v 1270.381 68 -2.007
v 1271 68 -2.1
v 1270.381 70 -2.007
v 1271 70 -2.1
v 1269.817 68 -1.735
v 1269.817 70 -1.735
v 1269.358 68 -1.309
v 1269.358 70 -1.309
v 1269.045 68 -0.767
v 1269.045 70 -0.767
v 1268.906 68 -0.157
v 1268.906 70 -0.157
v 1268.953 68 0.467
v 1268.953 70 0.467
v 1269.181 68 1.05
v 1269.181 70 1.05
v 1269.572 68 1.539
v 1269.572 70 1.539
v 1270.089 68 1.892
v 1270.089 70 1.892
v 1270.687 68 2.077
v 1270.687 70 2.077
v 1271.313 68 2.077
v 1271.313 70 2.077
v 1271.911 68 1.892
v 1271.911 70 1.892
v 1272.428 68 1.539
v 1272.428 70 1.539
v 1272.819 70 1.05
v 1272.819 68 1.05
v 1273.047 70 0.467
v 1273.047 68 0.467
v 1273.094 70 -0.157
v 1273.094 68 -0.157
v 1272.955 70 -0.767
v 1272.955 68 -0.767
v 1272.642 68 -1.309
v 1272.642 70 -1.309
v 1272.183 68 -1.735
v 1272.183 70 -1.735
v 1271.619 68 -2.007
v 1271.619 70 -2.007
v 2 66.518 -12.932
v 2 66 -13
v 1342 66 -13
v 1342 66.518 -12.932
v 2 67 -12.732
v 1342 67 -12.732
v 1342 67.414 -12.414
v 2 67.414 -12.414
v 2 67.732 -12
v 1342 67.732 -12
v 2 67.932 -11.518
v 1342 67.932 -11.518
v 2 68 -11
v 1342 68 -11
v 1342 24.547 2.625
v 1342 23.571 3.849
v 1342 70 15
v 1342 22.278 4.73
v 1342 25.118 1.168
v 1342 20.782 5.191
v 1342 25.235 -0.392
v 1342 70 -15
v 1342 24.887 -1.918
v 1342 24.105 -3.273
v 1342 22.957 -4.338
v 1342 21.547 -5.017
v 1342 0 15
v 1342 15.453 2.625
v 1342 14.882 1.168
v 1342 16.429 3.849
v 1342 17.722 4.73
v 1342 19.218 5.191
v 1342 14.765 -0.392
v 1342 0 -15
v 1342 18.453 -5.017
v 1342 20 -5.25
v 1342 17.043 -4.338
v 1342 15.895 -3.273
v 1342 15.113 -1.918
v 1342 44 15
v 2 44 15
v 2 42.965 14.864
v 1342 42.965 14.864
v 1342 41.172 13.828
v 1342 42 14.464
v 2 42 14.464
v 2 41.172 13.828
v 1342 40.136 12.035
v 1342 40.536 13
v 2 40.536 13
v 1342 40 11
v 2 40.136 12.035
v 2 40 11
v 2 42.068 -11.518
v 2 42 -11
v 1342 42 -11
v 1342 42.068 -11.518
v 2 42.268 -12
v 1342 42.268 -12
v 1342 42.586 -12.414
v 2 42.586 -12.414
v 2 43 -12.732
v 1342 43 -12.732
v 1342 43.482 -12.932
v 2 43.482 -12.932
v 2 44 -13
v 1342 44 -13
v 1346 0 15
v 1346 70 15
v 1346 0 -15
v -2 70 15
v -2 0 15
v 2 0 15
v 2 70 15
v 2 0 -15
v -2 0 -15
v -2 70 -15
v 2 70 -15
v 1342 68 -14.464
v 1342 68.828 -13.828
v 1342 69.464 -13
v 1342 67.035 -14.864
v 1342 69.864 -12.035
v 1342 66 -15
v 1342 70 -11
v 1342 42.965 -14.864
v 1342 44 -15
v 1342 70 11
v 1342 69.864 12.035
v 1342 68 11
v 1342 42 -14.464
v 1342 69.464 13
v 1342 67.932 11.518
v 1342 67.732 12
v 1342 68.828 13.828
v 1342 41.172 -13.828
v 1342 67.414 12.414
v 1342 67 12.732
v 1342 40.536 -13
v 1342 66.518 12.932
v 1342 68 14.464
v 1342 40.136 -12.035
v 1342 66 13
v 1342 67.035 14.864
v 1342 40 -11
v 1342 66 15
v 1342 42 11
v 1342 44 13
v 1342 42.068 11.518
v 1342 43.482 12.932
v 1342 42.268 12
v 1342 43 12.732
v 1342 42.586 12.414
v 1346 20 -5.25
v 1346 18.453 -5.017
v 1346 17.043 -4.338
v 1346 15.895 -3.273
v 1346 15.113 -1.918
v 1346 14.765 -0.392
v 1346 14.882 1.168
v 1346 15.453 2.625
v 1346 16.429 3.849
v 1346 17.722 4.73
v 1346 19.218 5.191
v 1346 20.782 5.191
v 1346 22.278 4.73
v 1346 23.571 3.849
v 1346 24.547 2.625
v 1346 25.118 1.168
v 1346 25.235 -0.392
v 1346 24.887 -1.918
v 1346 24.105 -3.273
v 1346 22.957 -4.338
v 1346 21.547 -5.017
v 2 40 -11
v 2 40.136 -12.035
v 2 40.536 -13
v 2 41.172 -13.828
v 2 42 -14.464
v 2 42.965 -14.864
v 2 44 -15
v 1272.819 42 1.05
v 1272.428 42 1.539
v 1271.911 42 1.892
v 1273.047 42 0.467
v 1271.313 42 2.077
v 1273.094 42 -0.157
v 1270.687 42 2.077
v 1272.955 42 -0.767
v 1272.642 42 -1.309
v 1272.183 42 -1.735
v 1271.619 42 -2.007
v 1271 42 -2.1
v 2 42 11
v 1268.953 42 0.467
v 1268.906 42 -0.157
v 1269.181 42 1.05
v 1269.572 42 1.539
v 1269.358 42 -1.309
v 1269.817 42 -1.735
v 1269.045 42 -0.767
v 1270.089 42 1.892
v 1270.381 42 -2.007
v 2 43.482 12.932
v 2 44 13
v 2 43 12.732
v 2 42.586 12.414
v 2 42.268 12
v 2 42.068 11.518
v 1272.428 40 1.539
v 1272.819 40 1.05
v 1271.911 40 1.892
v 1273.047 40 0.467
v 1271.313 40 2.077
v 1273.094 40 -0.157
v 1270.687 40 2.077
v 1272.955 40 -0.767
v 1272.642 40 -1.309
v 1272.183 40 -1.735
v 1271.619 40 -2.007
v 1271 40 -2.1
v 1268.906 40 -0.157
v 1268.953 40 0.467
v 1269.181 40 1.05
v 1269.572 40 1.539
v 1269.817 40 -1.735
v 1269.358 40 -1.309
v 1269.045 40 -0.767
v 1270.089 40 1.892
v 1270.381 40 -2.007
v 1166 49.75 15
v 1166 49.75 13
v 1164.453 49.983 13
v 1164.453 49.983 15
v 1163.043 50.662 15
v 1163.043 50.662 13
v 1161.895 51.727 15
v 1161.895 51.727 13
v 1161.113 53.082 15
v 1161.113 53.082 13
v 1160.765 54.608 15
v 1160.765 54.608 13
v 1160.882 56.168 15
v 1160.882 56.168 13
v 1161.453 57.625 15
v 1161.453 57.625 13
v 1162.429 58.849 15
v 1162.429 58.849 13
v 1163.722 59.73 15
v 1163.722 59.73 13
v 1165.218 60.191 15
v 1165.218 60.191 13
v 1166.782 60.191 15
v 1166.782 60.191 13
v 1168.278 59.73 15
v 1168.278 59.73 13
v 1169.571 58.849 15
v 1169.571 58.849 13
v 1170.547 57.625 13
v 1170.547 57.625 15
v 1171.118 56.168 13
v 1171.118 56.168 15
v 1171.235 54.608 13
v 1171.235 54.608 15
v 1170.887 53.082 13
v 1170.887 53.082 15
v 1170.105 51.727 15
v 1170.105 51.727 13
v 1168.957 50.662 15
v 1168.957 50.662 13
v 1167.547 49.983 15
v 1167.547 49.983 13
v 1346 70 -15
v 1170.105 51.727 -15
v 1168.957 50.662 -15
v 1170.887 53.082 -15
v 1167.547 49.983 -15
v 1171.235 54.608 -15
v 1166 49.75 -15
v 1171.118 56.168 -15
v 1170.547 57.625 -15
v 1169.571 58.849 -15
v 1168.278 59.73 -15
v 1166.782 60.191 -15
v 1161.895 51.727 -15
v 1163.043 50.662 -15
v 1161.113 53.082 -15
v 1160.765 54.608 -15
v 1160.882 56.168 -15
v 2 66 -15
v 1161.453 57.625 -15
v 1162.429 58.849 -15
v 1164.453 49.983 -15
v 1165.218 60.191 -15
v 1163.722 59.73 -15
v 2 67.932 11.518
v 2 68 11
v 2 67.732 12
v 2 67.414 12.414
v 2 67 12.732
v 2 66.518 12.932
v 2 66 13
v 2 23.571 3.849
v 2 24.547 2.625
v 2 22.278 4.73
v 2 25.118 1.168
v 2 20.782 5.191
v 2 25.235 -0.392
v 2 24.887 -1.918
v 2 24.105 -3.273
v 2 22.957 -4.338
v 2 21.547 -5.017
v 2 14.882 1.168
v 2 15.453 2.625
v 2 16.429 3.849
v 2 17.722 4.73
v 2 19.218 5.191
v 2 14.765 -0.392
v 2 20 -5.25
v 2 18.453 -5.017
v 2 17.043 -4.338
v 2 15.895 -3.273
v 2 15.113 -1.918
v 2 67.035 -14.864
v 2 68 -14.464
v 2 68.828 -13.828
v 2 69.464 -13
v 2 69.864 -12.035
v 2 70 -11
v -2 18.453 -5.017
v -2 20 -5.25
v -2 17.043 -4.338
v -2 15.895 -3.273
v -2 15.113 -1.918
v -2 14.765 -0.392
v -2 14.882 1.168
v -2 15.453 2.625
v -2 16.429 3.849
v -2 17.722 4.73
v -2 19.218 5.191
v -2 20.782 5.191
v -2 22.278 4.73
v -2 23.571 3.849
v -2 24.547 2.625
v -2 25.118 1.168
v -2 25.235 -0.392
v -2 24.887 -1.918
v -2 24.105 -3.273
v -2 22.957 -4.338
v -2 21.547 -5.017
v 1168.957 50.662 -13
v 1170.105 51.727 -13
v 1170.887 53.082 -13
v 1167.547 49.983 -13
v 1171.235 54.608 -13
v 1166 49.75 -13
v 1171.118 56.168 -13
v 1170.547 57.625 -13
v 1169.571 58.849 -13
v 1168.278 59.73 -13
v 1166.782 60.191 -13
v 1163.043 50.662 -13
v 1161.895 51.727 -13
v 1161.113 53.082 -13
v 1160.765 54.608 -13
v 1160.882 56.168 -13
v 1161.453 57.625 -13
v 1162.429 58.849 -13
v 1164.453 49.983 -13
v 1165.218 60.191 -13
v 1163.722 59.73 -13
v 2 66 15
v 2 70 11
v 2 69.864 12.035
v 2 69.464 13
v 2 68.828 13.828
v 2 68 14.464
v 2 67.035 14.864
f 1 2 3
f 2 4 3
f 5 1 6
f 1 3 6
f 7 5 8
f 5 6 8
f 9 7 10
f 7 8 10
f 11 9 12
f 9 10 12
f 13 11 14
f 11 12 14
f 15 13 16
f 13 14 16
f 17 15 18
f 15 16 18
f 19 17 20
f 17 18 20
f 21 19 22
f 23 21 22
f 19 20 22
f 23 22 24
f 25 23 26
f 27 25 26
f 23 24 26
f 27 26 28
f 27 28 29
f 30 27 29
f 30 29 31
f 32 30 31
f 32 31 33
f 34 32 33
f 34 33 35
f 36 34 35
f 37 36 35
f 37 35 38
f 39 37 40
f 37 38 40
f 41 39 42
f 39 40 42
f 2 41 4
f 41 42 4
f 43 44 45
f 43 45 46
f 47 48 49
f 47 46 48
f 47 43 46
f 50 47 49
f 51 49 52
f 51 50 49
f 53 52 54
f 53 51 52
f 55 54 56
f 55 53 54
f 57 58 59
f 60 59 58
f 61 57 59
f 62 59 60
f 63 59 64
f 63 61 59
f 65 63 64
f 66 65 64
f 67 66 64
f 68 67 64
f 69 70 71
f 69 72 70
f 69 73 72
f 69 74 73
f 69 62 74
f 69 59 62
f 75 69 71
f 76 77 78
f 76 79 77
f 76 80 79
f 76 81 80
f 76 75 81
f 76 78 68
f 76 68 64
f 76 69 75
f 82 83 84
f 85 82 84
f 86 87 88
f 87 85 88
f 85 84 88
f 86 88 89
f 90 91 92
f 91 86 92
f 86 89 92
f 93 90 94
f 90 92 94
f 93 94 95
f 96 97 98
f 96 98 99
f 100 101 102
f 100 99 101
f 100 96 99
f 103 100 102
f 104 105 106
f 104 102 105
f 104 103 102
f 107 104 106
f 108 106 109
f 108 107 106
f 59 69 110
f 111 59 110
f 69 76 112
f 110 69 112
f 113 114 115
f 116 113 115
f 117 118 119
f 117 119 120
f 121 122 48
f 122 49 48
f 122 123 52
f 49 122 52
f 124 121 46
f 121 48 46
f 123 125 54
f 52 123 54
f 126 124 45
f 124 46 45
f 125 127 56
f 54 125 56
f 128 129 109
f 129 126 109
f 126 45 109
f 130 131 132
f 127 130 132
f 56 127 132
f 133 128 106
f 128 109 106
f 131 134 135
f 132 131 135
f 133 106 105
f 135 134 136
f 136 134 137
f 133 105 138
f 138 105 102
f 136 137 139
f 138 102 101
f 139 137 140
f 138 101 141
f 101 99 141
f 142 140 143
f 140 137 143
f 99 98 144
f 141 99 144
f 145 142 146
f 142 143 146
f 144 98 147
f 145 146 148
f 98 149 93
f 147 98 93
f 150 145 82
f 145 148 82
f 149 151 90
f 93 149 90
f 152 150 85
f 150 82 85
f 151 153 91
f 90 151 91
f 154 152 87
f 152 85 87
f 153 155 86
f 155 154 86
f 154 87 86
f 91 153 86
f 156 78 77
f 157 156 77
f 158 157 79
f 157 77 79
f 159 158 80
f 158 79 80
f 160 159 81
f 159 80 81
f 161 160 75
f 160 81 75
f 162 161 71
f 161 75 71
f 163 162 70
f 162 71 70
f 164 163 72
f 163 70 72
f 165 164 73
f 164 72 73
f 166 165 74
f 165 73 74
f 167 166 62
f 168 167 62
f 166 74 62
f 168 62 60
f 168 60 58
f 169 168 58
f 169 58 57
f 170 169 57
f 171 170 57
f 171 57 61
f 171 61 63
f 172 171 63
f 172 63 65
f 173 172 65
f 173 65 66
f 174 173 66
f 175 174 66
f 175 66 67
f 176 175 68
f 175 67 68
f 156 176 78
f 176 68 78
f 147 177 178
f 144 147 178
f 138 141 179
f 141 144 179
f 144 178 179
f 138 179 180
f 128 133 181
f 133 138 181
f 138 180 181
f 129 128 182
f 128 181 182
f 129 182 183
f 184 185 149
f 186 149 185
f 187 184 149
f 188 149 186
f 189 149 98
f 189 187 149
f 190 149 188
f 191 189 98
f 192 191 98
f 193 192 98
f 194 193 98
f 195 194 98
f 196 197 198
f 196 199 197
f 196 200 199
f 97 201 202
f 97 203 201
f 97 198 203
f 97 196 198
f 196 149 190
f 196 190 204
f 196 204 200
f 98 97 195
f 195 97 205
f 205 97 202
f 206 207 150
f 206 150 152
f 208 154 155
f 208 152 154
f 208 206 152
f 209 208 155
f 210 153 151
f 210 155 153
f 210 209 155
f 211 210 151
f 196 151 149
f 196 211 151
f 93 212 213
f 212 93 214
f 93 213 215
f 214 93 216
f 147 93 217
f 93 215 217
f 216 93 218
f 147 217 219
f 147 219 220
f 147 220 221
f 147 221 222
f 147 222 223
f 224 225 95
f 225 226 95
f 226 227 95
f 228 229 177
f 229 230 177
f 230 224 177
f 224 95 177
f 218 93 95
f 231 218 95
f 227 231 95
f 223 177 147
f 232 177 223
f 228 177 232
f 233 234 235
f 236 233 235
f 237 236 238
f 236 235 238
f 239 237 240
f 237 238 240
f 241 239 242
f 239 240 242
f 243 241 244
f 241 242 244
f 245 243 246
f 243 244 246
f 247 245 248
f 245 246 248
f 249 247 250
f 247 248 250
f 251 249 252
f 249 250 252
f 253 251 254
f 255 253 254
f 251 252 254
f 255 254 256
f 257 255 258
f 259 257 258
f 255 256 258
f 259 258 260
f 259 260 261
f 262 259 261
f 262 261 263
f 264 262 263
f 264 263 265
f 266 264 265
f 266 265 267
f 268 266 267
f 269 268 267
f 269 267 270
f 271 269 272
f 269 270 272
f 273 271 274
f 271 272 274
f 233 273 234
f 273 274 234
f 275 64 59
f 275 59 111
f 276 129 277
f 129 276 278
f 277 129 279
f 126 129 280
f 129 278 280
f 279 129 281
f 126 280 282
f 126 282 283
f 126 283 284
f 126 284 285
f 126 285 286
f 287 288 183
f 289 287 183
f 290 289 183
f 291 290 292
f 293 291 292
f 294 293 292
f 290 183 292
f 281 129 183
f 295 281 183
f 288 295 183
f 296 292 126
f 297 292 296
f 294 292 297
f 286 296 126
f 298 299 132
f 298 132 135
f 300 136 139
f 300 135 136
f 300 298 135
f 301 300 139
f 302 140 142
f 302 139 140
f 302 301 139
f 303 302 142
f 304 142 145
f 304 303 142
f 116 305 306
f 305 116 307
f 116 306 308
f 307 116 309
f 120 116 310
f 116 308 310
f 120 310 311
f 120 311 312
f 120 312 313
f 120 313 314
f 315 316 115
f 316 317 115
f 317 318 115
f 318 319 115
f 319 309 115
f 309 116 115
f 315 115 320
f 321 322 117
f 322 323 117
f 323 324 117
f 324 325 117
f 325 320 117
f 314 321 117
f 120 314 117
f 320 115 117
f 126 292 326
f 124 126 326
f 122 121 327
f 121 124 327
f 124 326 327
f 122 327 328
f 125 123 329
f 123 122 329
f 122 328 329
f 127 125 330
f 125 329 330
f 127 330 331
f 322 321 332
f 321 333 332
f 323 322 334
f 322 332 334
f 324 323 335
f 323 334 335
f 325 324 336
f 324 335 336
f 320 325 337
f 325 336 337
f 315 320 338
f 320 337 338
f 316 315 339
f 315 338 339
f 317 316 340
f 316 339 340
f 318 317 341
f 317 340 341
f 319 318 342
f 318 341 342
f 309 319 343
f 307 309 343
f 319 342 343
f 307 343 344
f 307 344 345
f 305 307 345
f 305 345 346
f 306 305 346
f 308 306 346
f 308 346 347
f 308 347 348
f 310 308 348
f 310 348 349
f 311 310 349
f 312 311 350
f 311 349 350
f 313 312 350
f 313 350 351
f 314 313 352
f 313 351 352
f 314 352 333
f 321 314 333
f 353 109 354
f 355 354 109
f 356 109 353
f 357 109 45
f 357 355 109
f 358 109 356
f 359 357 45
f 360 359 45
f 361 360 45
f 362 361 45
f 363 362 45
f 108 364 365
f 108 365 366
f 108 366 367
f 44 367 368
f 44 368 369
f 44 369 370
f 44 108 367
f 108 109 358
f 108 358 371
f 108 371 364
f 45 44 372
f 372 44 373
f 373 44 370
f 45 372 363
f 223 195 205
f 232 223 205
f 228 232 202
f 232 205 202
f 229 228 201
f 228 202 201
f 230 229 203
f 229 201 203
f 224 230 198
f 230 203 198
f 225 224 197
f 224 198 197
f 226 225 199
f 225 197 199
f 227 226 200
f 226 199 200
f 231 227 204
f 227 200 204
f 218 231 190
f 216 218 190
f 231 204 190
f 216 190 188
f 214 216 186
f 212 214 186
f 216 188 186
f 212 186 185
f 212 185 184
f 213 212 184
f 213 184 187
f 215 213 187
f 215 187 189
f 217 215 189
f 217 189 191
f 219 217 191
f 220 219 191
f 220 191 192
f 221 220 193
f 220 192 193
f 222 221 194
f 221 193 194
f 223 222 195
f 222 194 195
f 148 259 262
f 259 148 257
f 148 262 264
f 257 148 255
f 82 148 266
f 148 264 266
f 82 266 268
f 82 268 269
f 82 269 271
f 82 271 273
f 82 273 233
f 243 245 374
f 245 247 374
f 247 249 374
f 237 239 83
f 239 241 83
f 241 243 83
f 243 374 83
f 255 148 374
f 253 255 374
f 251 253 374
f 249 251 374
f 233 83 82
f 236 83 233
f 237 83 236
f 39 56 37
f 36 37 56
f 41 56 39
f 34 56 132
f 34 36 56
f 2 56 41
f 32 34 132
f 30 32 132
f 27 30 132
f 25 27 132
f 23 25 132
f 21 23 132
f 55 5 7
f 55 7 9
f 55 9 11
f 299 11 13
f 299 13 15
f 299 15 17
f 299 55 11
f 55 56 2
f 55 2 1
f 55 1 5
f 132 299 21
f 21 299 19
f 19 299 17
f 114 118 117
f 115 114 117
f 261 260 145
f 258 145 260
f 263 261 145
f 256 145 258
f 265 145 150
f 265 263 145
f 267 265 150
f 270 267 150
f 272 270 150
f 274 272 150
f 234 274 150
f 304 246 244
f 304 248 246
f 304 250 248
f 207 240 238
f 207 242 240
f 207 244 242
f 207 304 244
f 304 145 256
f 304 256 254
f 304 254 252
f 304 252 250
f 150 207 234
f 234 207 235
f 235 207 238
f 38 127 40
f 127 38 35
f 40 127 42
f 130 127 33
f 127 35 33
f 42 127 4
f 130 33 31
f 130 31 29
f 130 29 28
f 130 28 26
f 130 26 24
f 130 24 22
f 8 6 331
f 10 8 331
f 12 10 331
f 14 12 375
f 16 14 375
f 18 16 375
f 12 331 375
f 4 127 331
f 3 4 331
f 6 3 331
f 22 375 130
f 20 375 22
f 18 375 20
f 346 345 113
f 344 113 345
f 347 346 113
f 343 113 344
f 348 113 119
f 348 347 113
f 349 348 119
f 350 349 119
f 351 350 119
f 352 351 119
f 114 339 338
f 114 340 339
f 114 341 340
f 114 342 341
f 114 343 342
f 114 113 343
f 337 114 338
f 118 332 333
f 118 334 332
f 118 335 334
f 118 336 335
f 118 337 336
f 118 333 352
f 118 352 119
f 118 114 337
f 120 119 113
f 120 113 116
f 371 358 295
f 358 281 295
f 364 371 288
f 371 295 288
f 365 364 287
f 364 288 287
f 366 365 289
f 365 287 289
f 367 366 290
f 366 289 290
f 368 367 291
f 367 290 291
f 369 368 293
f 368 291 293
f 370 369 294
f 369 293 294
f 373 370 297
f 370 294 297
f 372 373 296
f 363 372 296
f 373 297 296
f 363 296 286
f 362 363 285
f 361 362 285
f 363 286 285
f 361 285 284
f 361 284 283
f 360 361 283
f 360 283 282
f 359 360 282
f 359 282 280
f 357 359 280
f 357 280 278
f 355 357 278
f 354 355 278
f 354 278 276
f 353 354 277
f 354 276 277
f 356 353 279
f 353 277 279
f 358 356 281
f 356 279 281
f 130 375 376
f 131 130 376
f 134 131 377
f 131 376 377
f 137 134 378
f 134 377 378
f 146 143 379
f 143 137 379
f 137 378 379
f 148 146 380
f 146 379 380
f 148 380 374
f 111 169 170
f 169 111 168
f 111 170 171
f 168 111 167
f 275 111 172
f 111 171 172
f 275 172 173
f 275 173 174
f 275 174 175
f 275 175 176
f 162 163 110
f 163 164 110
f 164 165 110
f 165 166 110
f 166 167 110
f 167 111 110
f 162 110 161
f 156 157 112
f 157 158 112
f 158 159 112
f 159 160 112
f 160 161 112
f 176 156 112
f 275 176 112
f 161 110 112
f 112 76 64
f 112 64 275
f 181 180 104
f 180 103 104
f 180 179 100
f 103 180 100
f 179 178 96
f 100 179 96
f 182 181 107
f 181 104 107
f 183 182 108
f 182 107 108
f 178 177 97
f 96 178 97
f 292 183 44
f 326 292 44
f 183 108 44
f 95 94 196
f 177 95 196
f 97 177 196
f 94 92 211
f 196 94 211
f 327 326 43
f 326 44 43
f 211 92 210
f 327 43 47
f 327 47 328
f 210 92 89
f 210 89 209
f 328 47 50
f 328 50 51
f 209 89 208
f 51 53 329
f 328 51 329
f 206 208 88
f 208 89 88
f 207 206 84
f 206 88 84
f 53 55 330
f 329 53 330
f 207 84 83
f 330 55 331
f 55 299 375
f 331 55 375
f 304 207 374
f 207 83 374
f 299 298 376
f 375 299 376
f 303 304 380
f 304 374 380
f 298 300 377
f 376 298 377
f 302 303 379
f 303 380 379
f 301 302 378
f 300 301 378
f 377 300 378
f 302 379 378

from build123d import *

# Parameters (mm, degrees)
SQUARE_TUBE_CONFIGURED_30_X_30_X_2_DEPTH = 1344
SKETCH11_W                               = 4
SKETCH11_H                               = 30
STEEL_BAR_CONFIGURED_30_X_2_DEPTH        = 70
SKETCH11_ON_SEGMENT_2_W                  = 4
SKETCH11_ON_SEGMENT_2_H                  = 30
STEEL_BAR_CONFIGURED_30_X_2_2_DEPTH      = 70
SKETCH13_W                               = 5.25
SKETCH13_H                               = 1348
SKETCH16_W                               = 5.25
SKETCH16_H                               = 30
SKETCH20_W                               = 2.1
SKETCH20_H                               = 30


with BuildPart() as part:
    # Sketch1 → Square tube - configured 30 X 30 X 2 (new body)
    with BuildSketch(Plane(origin=(0, 55, 0), x_dir=(0, 0, -1), z_dir=(1, 0, 0))):
        with BuildLine():
            Line((-11, -15), (11, -15))
            ThreePointArc((11, -15), (13.828427125, -13.828427125), (15, -11))
            Line((15, -11), (15, 11))
            ThreePointArc((15, 11), (13.828427125, 13.828427125), (11, 15))
            Line((11, 15), (-11, 15))
            ThreePointArc((-11, 15), (-13.828427125, 13.828427125), (-15, 11))
            Line((-15, 11), (-15, -11))
            ThreePointArc((-15, -11), (-13.828427125, -13.828427125), (-11, -15))
        make_face()
        with BuildLine():
            Line((-11, -13), (11, -13))
            ThreePointArc((11, -13), (12.414213562, -12.414213562), (13, -11))
            Line((13, -11), (13, 11))
            ThreePointArc((13, 11), (12.414213562, 12.414213562), (11, 13))
            Line((11, 13), (-11, 13))
            ThreePointArc((-11, 13), (-12.414213562, 12.414213562), (-13, 11))
            Line((-13, 11), (-13, -11))
            ThreePointArc((-13, -11), (-12.414213562, -12.414213562), (-11, -13))
        make_face(mode=Mode.SUBTRACT)
    extrude(amount=SQUARE_TUBE_CONFIGURED_30_X_30_X_2_DEPTH)

    # Trim/Extend1
    split(bisect_by=Plane(origin=(1342, 35, 0), x_dir=(0, -1, 0), z_dir=(-1, 0, 0)), keep=Keep.TOP)

    # Trim_Extend1 3
    split(bisect_by=Plane(origin=(2, 35, 0), x_dir=(0, 1, 0), z_dir=(1, 0, 0)), keep=Keep.TOP)

    # Sketch16 → Ø10.5 (10.5) PC Shelf Mount Hole (revolve, cut)
    with BuildSketch(Plane(origin=(1166, 55, 15), x_dir=(0, -1, 0), z_dir=(1, 0, 0))):
        with Locations((2.625, 15)):
            Rectangle(SKETCH16_W, SKETCH16_H)
    revolve(axis=Axis((1166, 55, 21.35), (0, 0, -1)), mode=Mode.SUBTRACT)

    # Sketch20 → Ø4.2 (4.2) PC Shelf Table Mount Hole (revolve, cut)
    with BuildSketch(Plane(origin=(1271, 40, 0), x_dir=(0, 0, -1), z_dir=(1, 0, 0))):
        with Locations((1.05, 15)):
            Rectangle(SKETCH20_W, SKETCH20_H)
    revolve(axis=Axis((1271, 33.65, 0), (0, 1, 0)), mode=Mode.SUBTRACT)


with BuildPart() as body_2:
    # Sketch11 → Steel bar - configured 30 X 2 (new body)
    with BuildSketch(Plane(origin=(0, 0, 0), x_dir=(1, 0, 0), z_dir=(0, 1, 0))):
        Rectangle(SKETCH11_W, SKETCH11_H)
    extrude(amount=STEEL_BAR_CONFIGURED_30_X_2_DEPTH)


with BuildPart() as body_3:
    # Sketch11 on segment 2 (carried to segment 2) → Steel bar - configured 30 X 2 2 (new body)
    with BuildSketch(Plane(origin=(1344, 0, 0), x_dir=(1, 0, 0), z_dir=(0, 1, 0))):
        Rectangle(SKETCH11_ON_SEGMENT_2_W, SKETCH11_ON_SEGMENT_2_H)
    extrude(amount=STEEL_BAR_CONFIGURED_30_X_2_2_DEPTH)


with BuildPart() as f_10_5_10_5_frame_mount_holes_tool:
    # Sketch13 → Ø10.5 (10.5) Frame Mount Holes (revolve)
    with BuildSketch(Plane(origin=(1346, 20, 0), x_dir=(0, 0, -1), z_dir=(0, 1, 0))):
        with Locations((2.625, 674)):
            Rectangle(SKETCH13_W, SKETCH13_H)
    revolve(axis=Axis((1352.35, 20, 0), (-1, 0, 0)))


with BuildPart() as body_2_1:
    add(body_2.part)

    # Ø10.5 (10.5) Frame Mount Holes: cut by f_10_5_10_5_frame_mount_holes_tool
    add(f_10_5_10_5_frame_mount_holes_tool.part, mode=Mode.SUBTRACT)


with BuildPart() as body_3_1:
    add(body_3.part)

    # Ø10.5 (10.5) Frame Mount Holes: cut by f_10_5_10_5_frame_mount_holes_tool
    add(f_10_5_10_5_frame_mount_holes_tool.part, mode=Mode.SUBTRACT)


solid = Compound([part.part, body_2_1.part, body_3_1.part])
